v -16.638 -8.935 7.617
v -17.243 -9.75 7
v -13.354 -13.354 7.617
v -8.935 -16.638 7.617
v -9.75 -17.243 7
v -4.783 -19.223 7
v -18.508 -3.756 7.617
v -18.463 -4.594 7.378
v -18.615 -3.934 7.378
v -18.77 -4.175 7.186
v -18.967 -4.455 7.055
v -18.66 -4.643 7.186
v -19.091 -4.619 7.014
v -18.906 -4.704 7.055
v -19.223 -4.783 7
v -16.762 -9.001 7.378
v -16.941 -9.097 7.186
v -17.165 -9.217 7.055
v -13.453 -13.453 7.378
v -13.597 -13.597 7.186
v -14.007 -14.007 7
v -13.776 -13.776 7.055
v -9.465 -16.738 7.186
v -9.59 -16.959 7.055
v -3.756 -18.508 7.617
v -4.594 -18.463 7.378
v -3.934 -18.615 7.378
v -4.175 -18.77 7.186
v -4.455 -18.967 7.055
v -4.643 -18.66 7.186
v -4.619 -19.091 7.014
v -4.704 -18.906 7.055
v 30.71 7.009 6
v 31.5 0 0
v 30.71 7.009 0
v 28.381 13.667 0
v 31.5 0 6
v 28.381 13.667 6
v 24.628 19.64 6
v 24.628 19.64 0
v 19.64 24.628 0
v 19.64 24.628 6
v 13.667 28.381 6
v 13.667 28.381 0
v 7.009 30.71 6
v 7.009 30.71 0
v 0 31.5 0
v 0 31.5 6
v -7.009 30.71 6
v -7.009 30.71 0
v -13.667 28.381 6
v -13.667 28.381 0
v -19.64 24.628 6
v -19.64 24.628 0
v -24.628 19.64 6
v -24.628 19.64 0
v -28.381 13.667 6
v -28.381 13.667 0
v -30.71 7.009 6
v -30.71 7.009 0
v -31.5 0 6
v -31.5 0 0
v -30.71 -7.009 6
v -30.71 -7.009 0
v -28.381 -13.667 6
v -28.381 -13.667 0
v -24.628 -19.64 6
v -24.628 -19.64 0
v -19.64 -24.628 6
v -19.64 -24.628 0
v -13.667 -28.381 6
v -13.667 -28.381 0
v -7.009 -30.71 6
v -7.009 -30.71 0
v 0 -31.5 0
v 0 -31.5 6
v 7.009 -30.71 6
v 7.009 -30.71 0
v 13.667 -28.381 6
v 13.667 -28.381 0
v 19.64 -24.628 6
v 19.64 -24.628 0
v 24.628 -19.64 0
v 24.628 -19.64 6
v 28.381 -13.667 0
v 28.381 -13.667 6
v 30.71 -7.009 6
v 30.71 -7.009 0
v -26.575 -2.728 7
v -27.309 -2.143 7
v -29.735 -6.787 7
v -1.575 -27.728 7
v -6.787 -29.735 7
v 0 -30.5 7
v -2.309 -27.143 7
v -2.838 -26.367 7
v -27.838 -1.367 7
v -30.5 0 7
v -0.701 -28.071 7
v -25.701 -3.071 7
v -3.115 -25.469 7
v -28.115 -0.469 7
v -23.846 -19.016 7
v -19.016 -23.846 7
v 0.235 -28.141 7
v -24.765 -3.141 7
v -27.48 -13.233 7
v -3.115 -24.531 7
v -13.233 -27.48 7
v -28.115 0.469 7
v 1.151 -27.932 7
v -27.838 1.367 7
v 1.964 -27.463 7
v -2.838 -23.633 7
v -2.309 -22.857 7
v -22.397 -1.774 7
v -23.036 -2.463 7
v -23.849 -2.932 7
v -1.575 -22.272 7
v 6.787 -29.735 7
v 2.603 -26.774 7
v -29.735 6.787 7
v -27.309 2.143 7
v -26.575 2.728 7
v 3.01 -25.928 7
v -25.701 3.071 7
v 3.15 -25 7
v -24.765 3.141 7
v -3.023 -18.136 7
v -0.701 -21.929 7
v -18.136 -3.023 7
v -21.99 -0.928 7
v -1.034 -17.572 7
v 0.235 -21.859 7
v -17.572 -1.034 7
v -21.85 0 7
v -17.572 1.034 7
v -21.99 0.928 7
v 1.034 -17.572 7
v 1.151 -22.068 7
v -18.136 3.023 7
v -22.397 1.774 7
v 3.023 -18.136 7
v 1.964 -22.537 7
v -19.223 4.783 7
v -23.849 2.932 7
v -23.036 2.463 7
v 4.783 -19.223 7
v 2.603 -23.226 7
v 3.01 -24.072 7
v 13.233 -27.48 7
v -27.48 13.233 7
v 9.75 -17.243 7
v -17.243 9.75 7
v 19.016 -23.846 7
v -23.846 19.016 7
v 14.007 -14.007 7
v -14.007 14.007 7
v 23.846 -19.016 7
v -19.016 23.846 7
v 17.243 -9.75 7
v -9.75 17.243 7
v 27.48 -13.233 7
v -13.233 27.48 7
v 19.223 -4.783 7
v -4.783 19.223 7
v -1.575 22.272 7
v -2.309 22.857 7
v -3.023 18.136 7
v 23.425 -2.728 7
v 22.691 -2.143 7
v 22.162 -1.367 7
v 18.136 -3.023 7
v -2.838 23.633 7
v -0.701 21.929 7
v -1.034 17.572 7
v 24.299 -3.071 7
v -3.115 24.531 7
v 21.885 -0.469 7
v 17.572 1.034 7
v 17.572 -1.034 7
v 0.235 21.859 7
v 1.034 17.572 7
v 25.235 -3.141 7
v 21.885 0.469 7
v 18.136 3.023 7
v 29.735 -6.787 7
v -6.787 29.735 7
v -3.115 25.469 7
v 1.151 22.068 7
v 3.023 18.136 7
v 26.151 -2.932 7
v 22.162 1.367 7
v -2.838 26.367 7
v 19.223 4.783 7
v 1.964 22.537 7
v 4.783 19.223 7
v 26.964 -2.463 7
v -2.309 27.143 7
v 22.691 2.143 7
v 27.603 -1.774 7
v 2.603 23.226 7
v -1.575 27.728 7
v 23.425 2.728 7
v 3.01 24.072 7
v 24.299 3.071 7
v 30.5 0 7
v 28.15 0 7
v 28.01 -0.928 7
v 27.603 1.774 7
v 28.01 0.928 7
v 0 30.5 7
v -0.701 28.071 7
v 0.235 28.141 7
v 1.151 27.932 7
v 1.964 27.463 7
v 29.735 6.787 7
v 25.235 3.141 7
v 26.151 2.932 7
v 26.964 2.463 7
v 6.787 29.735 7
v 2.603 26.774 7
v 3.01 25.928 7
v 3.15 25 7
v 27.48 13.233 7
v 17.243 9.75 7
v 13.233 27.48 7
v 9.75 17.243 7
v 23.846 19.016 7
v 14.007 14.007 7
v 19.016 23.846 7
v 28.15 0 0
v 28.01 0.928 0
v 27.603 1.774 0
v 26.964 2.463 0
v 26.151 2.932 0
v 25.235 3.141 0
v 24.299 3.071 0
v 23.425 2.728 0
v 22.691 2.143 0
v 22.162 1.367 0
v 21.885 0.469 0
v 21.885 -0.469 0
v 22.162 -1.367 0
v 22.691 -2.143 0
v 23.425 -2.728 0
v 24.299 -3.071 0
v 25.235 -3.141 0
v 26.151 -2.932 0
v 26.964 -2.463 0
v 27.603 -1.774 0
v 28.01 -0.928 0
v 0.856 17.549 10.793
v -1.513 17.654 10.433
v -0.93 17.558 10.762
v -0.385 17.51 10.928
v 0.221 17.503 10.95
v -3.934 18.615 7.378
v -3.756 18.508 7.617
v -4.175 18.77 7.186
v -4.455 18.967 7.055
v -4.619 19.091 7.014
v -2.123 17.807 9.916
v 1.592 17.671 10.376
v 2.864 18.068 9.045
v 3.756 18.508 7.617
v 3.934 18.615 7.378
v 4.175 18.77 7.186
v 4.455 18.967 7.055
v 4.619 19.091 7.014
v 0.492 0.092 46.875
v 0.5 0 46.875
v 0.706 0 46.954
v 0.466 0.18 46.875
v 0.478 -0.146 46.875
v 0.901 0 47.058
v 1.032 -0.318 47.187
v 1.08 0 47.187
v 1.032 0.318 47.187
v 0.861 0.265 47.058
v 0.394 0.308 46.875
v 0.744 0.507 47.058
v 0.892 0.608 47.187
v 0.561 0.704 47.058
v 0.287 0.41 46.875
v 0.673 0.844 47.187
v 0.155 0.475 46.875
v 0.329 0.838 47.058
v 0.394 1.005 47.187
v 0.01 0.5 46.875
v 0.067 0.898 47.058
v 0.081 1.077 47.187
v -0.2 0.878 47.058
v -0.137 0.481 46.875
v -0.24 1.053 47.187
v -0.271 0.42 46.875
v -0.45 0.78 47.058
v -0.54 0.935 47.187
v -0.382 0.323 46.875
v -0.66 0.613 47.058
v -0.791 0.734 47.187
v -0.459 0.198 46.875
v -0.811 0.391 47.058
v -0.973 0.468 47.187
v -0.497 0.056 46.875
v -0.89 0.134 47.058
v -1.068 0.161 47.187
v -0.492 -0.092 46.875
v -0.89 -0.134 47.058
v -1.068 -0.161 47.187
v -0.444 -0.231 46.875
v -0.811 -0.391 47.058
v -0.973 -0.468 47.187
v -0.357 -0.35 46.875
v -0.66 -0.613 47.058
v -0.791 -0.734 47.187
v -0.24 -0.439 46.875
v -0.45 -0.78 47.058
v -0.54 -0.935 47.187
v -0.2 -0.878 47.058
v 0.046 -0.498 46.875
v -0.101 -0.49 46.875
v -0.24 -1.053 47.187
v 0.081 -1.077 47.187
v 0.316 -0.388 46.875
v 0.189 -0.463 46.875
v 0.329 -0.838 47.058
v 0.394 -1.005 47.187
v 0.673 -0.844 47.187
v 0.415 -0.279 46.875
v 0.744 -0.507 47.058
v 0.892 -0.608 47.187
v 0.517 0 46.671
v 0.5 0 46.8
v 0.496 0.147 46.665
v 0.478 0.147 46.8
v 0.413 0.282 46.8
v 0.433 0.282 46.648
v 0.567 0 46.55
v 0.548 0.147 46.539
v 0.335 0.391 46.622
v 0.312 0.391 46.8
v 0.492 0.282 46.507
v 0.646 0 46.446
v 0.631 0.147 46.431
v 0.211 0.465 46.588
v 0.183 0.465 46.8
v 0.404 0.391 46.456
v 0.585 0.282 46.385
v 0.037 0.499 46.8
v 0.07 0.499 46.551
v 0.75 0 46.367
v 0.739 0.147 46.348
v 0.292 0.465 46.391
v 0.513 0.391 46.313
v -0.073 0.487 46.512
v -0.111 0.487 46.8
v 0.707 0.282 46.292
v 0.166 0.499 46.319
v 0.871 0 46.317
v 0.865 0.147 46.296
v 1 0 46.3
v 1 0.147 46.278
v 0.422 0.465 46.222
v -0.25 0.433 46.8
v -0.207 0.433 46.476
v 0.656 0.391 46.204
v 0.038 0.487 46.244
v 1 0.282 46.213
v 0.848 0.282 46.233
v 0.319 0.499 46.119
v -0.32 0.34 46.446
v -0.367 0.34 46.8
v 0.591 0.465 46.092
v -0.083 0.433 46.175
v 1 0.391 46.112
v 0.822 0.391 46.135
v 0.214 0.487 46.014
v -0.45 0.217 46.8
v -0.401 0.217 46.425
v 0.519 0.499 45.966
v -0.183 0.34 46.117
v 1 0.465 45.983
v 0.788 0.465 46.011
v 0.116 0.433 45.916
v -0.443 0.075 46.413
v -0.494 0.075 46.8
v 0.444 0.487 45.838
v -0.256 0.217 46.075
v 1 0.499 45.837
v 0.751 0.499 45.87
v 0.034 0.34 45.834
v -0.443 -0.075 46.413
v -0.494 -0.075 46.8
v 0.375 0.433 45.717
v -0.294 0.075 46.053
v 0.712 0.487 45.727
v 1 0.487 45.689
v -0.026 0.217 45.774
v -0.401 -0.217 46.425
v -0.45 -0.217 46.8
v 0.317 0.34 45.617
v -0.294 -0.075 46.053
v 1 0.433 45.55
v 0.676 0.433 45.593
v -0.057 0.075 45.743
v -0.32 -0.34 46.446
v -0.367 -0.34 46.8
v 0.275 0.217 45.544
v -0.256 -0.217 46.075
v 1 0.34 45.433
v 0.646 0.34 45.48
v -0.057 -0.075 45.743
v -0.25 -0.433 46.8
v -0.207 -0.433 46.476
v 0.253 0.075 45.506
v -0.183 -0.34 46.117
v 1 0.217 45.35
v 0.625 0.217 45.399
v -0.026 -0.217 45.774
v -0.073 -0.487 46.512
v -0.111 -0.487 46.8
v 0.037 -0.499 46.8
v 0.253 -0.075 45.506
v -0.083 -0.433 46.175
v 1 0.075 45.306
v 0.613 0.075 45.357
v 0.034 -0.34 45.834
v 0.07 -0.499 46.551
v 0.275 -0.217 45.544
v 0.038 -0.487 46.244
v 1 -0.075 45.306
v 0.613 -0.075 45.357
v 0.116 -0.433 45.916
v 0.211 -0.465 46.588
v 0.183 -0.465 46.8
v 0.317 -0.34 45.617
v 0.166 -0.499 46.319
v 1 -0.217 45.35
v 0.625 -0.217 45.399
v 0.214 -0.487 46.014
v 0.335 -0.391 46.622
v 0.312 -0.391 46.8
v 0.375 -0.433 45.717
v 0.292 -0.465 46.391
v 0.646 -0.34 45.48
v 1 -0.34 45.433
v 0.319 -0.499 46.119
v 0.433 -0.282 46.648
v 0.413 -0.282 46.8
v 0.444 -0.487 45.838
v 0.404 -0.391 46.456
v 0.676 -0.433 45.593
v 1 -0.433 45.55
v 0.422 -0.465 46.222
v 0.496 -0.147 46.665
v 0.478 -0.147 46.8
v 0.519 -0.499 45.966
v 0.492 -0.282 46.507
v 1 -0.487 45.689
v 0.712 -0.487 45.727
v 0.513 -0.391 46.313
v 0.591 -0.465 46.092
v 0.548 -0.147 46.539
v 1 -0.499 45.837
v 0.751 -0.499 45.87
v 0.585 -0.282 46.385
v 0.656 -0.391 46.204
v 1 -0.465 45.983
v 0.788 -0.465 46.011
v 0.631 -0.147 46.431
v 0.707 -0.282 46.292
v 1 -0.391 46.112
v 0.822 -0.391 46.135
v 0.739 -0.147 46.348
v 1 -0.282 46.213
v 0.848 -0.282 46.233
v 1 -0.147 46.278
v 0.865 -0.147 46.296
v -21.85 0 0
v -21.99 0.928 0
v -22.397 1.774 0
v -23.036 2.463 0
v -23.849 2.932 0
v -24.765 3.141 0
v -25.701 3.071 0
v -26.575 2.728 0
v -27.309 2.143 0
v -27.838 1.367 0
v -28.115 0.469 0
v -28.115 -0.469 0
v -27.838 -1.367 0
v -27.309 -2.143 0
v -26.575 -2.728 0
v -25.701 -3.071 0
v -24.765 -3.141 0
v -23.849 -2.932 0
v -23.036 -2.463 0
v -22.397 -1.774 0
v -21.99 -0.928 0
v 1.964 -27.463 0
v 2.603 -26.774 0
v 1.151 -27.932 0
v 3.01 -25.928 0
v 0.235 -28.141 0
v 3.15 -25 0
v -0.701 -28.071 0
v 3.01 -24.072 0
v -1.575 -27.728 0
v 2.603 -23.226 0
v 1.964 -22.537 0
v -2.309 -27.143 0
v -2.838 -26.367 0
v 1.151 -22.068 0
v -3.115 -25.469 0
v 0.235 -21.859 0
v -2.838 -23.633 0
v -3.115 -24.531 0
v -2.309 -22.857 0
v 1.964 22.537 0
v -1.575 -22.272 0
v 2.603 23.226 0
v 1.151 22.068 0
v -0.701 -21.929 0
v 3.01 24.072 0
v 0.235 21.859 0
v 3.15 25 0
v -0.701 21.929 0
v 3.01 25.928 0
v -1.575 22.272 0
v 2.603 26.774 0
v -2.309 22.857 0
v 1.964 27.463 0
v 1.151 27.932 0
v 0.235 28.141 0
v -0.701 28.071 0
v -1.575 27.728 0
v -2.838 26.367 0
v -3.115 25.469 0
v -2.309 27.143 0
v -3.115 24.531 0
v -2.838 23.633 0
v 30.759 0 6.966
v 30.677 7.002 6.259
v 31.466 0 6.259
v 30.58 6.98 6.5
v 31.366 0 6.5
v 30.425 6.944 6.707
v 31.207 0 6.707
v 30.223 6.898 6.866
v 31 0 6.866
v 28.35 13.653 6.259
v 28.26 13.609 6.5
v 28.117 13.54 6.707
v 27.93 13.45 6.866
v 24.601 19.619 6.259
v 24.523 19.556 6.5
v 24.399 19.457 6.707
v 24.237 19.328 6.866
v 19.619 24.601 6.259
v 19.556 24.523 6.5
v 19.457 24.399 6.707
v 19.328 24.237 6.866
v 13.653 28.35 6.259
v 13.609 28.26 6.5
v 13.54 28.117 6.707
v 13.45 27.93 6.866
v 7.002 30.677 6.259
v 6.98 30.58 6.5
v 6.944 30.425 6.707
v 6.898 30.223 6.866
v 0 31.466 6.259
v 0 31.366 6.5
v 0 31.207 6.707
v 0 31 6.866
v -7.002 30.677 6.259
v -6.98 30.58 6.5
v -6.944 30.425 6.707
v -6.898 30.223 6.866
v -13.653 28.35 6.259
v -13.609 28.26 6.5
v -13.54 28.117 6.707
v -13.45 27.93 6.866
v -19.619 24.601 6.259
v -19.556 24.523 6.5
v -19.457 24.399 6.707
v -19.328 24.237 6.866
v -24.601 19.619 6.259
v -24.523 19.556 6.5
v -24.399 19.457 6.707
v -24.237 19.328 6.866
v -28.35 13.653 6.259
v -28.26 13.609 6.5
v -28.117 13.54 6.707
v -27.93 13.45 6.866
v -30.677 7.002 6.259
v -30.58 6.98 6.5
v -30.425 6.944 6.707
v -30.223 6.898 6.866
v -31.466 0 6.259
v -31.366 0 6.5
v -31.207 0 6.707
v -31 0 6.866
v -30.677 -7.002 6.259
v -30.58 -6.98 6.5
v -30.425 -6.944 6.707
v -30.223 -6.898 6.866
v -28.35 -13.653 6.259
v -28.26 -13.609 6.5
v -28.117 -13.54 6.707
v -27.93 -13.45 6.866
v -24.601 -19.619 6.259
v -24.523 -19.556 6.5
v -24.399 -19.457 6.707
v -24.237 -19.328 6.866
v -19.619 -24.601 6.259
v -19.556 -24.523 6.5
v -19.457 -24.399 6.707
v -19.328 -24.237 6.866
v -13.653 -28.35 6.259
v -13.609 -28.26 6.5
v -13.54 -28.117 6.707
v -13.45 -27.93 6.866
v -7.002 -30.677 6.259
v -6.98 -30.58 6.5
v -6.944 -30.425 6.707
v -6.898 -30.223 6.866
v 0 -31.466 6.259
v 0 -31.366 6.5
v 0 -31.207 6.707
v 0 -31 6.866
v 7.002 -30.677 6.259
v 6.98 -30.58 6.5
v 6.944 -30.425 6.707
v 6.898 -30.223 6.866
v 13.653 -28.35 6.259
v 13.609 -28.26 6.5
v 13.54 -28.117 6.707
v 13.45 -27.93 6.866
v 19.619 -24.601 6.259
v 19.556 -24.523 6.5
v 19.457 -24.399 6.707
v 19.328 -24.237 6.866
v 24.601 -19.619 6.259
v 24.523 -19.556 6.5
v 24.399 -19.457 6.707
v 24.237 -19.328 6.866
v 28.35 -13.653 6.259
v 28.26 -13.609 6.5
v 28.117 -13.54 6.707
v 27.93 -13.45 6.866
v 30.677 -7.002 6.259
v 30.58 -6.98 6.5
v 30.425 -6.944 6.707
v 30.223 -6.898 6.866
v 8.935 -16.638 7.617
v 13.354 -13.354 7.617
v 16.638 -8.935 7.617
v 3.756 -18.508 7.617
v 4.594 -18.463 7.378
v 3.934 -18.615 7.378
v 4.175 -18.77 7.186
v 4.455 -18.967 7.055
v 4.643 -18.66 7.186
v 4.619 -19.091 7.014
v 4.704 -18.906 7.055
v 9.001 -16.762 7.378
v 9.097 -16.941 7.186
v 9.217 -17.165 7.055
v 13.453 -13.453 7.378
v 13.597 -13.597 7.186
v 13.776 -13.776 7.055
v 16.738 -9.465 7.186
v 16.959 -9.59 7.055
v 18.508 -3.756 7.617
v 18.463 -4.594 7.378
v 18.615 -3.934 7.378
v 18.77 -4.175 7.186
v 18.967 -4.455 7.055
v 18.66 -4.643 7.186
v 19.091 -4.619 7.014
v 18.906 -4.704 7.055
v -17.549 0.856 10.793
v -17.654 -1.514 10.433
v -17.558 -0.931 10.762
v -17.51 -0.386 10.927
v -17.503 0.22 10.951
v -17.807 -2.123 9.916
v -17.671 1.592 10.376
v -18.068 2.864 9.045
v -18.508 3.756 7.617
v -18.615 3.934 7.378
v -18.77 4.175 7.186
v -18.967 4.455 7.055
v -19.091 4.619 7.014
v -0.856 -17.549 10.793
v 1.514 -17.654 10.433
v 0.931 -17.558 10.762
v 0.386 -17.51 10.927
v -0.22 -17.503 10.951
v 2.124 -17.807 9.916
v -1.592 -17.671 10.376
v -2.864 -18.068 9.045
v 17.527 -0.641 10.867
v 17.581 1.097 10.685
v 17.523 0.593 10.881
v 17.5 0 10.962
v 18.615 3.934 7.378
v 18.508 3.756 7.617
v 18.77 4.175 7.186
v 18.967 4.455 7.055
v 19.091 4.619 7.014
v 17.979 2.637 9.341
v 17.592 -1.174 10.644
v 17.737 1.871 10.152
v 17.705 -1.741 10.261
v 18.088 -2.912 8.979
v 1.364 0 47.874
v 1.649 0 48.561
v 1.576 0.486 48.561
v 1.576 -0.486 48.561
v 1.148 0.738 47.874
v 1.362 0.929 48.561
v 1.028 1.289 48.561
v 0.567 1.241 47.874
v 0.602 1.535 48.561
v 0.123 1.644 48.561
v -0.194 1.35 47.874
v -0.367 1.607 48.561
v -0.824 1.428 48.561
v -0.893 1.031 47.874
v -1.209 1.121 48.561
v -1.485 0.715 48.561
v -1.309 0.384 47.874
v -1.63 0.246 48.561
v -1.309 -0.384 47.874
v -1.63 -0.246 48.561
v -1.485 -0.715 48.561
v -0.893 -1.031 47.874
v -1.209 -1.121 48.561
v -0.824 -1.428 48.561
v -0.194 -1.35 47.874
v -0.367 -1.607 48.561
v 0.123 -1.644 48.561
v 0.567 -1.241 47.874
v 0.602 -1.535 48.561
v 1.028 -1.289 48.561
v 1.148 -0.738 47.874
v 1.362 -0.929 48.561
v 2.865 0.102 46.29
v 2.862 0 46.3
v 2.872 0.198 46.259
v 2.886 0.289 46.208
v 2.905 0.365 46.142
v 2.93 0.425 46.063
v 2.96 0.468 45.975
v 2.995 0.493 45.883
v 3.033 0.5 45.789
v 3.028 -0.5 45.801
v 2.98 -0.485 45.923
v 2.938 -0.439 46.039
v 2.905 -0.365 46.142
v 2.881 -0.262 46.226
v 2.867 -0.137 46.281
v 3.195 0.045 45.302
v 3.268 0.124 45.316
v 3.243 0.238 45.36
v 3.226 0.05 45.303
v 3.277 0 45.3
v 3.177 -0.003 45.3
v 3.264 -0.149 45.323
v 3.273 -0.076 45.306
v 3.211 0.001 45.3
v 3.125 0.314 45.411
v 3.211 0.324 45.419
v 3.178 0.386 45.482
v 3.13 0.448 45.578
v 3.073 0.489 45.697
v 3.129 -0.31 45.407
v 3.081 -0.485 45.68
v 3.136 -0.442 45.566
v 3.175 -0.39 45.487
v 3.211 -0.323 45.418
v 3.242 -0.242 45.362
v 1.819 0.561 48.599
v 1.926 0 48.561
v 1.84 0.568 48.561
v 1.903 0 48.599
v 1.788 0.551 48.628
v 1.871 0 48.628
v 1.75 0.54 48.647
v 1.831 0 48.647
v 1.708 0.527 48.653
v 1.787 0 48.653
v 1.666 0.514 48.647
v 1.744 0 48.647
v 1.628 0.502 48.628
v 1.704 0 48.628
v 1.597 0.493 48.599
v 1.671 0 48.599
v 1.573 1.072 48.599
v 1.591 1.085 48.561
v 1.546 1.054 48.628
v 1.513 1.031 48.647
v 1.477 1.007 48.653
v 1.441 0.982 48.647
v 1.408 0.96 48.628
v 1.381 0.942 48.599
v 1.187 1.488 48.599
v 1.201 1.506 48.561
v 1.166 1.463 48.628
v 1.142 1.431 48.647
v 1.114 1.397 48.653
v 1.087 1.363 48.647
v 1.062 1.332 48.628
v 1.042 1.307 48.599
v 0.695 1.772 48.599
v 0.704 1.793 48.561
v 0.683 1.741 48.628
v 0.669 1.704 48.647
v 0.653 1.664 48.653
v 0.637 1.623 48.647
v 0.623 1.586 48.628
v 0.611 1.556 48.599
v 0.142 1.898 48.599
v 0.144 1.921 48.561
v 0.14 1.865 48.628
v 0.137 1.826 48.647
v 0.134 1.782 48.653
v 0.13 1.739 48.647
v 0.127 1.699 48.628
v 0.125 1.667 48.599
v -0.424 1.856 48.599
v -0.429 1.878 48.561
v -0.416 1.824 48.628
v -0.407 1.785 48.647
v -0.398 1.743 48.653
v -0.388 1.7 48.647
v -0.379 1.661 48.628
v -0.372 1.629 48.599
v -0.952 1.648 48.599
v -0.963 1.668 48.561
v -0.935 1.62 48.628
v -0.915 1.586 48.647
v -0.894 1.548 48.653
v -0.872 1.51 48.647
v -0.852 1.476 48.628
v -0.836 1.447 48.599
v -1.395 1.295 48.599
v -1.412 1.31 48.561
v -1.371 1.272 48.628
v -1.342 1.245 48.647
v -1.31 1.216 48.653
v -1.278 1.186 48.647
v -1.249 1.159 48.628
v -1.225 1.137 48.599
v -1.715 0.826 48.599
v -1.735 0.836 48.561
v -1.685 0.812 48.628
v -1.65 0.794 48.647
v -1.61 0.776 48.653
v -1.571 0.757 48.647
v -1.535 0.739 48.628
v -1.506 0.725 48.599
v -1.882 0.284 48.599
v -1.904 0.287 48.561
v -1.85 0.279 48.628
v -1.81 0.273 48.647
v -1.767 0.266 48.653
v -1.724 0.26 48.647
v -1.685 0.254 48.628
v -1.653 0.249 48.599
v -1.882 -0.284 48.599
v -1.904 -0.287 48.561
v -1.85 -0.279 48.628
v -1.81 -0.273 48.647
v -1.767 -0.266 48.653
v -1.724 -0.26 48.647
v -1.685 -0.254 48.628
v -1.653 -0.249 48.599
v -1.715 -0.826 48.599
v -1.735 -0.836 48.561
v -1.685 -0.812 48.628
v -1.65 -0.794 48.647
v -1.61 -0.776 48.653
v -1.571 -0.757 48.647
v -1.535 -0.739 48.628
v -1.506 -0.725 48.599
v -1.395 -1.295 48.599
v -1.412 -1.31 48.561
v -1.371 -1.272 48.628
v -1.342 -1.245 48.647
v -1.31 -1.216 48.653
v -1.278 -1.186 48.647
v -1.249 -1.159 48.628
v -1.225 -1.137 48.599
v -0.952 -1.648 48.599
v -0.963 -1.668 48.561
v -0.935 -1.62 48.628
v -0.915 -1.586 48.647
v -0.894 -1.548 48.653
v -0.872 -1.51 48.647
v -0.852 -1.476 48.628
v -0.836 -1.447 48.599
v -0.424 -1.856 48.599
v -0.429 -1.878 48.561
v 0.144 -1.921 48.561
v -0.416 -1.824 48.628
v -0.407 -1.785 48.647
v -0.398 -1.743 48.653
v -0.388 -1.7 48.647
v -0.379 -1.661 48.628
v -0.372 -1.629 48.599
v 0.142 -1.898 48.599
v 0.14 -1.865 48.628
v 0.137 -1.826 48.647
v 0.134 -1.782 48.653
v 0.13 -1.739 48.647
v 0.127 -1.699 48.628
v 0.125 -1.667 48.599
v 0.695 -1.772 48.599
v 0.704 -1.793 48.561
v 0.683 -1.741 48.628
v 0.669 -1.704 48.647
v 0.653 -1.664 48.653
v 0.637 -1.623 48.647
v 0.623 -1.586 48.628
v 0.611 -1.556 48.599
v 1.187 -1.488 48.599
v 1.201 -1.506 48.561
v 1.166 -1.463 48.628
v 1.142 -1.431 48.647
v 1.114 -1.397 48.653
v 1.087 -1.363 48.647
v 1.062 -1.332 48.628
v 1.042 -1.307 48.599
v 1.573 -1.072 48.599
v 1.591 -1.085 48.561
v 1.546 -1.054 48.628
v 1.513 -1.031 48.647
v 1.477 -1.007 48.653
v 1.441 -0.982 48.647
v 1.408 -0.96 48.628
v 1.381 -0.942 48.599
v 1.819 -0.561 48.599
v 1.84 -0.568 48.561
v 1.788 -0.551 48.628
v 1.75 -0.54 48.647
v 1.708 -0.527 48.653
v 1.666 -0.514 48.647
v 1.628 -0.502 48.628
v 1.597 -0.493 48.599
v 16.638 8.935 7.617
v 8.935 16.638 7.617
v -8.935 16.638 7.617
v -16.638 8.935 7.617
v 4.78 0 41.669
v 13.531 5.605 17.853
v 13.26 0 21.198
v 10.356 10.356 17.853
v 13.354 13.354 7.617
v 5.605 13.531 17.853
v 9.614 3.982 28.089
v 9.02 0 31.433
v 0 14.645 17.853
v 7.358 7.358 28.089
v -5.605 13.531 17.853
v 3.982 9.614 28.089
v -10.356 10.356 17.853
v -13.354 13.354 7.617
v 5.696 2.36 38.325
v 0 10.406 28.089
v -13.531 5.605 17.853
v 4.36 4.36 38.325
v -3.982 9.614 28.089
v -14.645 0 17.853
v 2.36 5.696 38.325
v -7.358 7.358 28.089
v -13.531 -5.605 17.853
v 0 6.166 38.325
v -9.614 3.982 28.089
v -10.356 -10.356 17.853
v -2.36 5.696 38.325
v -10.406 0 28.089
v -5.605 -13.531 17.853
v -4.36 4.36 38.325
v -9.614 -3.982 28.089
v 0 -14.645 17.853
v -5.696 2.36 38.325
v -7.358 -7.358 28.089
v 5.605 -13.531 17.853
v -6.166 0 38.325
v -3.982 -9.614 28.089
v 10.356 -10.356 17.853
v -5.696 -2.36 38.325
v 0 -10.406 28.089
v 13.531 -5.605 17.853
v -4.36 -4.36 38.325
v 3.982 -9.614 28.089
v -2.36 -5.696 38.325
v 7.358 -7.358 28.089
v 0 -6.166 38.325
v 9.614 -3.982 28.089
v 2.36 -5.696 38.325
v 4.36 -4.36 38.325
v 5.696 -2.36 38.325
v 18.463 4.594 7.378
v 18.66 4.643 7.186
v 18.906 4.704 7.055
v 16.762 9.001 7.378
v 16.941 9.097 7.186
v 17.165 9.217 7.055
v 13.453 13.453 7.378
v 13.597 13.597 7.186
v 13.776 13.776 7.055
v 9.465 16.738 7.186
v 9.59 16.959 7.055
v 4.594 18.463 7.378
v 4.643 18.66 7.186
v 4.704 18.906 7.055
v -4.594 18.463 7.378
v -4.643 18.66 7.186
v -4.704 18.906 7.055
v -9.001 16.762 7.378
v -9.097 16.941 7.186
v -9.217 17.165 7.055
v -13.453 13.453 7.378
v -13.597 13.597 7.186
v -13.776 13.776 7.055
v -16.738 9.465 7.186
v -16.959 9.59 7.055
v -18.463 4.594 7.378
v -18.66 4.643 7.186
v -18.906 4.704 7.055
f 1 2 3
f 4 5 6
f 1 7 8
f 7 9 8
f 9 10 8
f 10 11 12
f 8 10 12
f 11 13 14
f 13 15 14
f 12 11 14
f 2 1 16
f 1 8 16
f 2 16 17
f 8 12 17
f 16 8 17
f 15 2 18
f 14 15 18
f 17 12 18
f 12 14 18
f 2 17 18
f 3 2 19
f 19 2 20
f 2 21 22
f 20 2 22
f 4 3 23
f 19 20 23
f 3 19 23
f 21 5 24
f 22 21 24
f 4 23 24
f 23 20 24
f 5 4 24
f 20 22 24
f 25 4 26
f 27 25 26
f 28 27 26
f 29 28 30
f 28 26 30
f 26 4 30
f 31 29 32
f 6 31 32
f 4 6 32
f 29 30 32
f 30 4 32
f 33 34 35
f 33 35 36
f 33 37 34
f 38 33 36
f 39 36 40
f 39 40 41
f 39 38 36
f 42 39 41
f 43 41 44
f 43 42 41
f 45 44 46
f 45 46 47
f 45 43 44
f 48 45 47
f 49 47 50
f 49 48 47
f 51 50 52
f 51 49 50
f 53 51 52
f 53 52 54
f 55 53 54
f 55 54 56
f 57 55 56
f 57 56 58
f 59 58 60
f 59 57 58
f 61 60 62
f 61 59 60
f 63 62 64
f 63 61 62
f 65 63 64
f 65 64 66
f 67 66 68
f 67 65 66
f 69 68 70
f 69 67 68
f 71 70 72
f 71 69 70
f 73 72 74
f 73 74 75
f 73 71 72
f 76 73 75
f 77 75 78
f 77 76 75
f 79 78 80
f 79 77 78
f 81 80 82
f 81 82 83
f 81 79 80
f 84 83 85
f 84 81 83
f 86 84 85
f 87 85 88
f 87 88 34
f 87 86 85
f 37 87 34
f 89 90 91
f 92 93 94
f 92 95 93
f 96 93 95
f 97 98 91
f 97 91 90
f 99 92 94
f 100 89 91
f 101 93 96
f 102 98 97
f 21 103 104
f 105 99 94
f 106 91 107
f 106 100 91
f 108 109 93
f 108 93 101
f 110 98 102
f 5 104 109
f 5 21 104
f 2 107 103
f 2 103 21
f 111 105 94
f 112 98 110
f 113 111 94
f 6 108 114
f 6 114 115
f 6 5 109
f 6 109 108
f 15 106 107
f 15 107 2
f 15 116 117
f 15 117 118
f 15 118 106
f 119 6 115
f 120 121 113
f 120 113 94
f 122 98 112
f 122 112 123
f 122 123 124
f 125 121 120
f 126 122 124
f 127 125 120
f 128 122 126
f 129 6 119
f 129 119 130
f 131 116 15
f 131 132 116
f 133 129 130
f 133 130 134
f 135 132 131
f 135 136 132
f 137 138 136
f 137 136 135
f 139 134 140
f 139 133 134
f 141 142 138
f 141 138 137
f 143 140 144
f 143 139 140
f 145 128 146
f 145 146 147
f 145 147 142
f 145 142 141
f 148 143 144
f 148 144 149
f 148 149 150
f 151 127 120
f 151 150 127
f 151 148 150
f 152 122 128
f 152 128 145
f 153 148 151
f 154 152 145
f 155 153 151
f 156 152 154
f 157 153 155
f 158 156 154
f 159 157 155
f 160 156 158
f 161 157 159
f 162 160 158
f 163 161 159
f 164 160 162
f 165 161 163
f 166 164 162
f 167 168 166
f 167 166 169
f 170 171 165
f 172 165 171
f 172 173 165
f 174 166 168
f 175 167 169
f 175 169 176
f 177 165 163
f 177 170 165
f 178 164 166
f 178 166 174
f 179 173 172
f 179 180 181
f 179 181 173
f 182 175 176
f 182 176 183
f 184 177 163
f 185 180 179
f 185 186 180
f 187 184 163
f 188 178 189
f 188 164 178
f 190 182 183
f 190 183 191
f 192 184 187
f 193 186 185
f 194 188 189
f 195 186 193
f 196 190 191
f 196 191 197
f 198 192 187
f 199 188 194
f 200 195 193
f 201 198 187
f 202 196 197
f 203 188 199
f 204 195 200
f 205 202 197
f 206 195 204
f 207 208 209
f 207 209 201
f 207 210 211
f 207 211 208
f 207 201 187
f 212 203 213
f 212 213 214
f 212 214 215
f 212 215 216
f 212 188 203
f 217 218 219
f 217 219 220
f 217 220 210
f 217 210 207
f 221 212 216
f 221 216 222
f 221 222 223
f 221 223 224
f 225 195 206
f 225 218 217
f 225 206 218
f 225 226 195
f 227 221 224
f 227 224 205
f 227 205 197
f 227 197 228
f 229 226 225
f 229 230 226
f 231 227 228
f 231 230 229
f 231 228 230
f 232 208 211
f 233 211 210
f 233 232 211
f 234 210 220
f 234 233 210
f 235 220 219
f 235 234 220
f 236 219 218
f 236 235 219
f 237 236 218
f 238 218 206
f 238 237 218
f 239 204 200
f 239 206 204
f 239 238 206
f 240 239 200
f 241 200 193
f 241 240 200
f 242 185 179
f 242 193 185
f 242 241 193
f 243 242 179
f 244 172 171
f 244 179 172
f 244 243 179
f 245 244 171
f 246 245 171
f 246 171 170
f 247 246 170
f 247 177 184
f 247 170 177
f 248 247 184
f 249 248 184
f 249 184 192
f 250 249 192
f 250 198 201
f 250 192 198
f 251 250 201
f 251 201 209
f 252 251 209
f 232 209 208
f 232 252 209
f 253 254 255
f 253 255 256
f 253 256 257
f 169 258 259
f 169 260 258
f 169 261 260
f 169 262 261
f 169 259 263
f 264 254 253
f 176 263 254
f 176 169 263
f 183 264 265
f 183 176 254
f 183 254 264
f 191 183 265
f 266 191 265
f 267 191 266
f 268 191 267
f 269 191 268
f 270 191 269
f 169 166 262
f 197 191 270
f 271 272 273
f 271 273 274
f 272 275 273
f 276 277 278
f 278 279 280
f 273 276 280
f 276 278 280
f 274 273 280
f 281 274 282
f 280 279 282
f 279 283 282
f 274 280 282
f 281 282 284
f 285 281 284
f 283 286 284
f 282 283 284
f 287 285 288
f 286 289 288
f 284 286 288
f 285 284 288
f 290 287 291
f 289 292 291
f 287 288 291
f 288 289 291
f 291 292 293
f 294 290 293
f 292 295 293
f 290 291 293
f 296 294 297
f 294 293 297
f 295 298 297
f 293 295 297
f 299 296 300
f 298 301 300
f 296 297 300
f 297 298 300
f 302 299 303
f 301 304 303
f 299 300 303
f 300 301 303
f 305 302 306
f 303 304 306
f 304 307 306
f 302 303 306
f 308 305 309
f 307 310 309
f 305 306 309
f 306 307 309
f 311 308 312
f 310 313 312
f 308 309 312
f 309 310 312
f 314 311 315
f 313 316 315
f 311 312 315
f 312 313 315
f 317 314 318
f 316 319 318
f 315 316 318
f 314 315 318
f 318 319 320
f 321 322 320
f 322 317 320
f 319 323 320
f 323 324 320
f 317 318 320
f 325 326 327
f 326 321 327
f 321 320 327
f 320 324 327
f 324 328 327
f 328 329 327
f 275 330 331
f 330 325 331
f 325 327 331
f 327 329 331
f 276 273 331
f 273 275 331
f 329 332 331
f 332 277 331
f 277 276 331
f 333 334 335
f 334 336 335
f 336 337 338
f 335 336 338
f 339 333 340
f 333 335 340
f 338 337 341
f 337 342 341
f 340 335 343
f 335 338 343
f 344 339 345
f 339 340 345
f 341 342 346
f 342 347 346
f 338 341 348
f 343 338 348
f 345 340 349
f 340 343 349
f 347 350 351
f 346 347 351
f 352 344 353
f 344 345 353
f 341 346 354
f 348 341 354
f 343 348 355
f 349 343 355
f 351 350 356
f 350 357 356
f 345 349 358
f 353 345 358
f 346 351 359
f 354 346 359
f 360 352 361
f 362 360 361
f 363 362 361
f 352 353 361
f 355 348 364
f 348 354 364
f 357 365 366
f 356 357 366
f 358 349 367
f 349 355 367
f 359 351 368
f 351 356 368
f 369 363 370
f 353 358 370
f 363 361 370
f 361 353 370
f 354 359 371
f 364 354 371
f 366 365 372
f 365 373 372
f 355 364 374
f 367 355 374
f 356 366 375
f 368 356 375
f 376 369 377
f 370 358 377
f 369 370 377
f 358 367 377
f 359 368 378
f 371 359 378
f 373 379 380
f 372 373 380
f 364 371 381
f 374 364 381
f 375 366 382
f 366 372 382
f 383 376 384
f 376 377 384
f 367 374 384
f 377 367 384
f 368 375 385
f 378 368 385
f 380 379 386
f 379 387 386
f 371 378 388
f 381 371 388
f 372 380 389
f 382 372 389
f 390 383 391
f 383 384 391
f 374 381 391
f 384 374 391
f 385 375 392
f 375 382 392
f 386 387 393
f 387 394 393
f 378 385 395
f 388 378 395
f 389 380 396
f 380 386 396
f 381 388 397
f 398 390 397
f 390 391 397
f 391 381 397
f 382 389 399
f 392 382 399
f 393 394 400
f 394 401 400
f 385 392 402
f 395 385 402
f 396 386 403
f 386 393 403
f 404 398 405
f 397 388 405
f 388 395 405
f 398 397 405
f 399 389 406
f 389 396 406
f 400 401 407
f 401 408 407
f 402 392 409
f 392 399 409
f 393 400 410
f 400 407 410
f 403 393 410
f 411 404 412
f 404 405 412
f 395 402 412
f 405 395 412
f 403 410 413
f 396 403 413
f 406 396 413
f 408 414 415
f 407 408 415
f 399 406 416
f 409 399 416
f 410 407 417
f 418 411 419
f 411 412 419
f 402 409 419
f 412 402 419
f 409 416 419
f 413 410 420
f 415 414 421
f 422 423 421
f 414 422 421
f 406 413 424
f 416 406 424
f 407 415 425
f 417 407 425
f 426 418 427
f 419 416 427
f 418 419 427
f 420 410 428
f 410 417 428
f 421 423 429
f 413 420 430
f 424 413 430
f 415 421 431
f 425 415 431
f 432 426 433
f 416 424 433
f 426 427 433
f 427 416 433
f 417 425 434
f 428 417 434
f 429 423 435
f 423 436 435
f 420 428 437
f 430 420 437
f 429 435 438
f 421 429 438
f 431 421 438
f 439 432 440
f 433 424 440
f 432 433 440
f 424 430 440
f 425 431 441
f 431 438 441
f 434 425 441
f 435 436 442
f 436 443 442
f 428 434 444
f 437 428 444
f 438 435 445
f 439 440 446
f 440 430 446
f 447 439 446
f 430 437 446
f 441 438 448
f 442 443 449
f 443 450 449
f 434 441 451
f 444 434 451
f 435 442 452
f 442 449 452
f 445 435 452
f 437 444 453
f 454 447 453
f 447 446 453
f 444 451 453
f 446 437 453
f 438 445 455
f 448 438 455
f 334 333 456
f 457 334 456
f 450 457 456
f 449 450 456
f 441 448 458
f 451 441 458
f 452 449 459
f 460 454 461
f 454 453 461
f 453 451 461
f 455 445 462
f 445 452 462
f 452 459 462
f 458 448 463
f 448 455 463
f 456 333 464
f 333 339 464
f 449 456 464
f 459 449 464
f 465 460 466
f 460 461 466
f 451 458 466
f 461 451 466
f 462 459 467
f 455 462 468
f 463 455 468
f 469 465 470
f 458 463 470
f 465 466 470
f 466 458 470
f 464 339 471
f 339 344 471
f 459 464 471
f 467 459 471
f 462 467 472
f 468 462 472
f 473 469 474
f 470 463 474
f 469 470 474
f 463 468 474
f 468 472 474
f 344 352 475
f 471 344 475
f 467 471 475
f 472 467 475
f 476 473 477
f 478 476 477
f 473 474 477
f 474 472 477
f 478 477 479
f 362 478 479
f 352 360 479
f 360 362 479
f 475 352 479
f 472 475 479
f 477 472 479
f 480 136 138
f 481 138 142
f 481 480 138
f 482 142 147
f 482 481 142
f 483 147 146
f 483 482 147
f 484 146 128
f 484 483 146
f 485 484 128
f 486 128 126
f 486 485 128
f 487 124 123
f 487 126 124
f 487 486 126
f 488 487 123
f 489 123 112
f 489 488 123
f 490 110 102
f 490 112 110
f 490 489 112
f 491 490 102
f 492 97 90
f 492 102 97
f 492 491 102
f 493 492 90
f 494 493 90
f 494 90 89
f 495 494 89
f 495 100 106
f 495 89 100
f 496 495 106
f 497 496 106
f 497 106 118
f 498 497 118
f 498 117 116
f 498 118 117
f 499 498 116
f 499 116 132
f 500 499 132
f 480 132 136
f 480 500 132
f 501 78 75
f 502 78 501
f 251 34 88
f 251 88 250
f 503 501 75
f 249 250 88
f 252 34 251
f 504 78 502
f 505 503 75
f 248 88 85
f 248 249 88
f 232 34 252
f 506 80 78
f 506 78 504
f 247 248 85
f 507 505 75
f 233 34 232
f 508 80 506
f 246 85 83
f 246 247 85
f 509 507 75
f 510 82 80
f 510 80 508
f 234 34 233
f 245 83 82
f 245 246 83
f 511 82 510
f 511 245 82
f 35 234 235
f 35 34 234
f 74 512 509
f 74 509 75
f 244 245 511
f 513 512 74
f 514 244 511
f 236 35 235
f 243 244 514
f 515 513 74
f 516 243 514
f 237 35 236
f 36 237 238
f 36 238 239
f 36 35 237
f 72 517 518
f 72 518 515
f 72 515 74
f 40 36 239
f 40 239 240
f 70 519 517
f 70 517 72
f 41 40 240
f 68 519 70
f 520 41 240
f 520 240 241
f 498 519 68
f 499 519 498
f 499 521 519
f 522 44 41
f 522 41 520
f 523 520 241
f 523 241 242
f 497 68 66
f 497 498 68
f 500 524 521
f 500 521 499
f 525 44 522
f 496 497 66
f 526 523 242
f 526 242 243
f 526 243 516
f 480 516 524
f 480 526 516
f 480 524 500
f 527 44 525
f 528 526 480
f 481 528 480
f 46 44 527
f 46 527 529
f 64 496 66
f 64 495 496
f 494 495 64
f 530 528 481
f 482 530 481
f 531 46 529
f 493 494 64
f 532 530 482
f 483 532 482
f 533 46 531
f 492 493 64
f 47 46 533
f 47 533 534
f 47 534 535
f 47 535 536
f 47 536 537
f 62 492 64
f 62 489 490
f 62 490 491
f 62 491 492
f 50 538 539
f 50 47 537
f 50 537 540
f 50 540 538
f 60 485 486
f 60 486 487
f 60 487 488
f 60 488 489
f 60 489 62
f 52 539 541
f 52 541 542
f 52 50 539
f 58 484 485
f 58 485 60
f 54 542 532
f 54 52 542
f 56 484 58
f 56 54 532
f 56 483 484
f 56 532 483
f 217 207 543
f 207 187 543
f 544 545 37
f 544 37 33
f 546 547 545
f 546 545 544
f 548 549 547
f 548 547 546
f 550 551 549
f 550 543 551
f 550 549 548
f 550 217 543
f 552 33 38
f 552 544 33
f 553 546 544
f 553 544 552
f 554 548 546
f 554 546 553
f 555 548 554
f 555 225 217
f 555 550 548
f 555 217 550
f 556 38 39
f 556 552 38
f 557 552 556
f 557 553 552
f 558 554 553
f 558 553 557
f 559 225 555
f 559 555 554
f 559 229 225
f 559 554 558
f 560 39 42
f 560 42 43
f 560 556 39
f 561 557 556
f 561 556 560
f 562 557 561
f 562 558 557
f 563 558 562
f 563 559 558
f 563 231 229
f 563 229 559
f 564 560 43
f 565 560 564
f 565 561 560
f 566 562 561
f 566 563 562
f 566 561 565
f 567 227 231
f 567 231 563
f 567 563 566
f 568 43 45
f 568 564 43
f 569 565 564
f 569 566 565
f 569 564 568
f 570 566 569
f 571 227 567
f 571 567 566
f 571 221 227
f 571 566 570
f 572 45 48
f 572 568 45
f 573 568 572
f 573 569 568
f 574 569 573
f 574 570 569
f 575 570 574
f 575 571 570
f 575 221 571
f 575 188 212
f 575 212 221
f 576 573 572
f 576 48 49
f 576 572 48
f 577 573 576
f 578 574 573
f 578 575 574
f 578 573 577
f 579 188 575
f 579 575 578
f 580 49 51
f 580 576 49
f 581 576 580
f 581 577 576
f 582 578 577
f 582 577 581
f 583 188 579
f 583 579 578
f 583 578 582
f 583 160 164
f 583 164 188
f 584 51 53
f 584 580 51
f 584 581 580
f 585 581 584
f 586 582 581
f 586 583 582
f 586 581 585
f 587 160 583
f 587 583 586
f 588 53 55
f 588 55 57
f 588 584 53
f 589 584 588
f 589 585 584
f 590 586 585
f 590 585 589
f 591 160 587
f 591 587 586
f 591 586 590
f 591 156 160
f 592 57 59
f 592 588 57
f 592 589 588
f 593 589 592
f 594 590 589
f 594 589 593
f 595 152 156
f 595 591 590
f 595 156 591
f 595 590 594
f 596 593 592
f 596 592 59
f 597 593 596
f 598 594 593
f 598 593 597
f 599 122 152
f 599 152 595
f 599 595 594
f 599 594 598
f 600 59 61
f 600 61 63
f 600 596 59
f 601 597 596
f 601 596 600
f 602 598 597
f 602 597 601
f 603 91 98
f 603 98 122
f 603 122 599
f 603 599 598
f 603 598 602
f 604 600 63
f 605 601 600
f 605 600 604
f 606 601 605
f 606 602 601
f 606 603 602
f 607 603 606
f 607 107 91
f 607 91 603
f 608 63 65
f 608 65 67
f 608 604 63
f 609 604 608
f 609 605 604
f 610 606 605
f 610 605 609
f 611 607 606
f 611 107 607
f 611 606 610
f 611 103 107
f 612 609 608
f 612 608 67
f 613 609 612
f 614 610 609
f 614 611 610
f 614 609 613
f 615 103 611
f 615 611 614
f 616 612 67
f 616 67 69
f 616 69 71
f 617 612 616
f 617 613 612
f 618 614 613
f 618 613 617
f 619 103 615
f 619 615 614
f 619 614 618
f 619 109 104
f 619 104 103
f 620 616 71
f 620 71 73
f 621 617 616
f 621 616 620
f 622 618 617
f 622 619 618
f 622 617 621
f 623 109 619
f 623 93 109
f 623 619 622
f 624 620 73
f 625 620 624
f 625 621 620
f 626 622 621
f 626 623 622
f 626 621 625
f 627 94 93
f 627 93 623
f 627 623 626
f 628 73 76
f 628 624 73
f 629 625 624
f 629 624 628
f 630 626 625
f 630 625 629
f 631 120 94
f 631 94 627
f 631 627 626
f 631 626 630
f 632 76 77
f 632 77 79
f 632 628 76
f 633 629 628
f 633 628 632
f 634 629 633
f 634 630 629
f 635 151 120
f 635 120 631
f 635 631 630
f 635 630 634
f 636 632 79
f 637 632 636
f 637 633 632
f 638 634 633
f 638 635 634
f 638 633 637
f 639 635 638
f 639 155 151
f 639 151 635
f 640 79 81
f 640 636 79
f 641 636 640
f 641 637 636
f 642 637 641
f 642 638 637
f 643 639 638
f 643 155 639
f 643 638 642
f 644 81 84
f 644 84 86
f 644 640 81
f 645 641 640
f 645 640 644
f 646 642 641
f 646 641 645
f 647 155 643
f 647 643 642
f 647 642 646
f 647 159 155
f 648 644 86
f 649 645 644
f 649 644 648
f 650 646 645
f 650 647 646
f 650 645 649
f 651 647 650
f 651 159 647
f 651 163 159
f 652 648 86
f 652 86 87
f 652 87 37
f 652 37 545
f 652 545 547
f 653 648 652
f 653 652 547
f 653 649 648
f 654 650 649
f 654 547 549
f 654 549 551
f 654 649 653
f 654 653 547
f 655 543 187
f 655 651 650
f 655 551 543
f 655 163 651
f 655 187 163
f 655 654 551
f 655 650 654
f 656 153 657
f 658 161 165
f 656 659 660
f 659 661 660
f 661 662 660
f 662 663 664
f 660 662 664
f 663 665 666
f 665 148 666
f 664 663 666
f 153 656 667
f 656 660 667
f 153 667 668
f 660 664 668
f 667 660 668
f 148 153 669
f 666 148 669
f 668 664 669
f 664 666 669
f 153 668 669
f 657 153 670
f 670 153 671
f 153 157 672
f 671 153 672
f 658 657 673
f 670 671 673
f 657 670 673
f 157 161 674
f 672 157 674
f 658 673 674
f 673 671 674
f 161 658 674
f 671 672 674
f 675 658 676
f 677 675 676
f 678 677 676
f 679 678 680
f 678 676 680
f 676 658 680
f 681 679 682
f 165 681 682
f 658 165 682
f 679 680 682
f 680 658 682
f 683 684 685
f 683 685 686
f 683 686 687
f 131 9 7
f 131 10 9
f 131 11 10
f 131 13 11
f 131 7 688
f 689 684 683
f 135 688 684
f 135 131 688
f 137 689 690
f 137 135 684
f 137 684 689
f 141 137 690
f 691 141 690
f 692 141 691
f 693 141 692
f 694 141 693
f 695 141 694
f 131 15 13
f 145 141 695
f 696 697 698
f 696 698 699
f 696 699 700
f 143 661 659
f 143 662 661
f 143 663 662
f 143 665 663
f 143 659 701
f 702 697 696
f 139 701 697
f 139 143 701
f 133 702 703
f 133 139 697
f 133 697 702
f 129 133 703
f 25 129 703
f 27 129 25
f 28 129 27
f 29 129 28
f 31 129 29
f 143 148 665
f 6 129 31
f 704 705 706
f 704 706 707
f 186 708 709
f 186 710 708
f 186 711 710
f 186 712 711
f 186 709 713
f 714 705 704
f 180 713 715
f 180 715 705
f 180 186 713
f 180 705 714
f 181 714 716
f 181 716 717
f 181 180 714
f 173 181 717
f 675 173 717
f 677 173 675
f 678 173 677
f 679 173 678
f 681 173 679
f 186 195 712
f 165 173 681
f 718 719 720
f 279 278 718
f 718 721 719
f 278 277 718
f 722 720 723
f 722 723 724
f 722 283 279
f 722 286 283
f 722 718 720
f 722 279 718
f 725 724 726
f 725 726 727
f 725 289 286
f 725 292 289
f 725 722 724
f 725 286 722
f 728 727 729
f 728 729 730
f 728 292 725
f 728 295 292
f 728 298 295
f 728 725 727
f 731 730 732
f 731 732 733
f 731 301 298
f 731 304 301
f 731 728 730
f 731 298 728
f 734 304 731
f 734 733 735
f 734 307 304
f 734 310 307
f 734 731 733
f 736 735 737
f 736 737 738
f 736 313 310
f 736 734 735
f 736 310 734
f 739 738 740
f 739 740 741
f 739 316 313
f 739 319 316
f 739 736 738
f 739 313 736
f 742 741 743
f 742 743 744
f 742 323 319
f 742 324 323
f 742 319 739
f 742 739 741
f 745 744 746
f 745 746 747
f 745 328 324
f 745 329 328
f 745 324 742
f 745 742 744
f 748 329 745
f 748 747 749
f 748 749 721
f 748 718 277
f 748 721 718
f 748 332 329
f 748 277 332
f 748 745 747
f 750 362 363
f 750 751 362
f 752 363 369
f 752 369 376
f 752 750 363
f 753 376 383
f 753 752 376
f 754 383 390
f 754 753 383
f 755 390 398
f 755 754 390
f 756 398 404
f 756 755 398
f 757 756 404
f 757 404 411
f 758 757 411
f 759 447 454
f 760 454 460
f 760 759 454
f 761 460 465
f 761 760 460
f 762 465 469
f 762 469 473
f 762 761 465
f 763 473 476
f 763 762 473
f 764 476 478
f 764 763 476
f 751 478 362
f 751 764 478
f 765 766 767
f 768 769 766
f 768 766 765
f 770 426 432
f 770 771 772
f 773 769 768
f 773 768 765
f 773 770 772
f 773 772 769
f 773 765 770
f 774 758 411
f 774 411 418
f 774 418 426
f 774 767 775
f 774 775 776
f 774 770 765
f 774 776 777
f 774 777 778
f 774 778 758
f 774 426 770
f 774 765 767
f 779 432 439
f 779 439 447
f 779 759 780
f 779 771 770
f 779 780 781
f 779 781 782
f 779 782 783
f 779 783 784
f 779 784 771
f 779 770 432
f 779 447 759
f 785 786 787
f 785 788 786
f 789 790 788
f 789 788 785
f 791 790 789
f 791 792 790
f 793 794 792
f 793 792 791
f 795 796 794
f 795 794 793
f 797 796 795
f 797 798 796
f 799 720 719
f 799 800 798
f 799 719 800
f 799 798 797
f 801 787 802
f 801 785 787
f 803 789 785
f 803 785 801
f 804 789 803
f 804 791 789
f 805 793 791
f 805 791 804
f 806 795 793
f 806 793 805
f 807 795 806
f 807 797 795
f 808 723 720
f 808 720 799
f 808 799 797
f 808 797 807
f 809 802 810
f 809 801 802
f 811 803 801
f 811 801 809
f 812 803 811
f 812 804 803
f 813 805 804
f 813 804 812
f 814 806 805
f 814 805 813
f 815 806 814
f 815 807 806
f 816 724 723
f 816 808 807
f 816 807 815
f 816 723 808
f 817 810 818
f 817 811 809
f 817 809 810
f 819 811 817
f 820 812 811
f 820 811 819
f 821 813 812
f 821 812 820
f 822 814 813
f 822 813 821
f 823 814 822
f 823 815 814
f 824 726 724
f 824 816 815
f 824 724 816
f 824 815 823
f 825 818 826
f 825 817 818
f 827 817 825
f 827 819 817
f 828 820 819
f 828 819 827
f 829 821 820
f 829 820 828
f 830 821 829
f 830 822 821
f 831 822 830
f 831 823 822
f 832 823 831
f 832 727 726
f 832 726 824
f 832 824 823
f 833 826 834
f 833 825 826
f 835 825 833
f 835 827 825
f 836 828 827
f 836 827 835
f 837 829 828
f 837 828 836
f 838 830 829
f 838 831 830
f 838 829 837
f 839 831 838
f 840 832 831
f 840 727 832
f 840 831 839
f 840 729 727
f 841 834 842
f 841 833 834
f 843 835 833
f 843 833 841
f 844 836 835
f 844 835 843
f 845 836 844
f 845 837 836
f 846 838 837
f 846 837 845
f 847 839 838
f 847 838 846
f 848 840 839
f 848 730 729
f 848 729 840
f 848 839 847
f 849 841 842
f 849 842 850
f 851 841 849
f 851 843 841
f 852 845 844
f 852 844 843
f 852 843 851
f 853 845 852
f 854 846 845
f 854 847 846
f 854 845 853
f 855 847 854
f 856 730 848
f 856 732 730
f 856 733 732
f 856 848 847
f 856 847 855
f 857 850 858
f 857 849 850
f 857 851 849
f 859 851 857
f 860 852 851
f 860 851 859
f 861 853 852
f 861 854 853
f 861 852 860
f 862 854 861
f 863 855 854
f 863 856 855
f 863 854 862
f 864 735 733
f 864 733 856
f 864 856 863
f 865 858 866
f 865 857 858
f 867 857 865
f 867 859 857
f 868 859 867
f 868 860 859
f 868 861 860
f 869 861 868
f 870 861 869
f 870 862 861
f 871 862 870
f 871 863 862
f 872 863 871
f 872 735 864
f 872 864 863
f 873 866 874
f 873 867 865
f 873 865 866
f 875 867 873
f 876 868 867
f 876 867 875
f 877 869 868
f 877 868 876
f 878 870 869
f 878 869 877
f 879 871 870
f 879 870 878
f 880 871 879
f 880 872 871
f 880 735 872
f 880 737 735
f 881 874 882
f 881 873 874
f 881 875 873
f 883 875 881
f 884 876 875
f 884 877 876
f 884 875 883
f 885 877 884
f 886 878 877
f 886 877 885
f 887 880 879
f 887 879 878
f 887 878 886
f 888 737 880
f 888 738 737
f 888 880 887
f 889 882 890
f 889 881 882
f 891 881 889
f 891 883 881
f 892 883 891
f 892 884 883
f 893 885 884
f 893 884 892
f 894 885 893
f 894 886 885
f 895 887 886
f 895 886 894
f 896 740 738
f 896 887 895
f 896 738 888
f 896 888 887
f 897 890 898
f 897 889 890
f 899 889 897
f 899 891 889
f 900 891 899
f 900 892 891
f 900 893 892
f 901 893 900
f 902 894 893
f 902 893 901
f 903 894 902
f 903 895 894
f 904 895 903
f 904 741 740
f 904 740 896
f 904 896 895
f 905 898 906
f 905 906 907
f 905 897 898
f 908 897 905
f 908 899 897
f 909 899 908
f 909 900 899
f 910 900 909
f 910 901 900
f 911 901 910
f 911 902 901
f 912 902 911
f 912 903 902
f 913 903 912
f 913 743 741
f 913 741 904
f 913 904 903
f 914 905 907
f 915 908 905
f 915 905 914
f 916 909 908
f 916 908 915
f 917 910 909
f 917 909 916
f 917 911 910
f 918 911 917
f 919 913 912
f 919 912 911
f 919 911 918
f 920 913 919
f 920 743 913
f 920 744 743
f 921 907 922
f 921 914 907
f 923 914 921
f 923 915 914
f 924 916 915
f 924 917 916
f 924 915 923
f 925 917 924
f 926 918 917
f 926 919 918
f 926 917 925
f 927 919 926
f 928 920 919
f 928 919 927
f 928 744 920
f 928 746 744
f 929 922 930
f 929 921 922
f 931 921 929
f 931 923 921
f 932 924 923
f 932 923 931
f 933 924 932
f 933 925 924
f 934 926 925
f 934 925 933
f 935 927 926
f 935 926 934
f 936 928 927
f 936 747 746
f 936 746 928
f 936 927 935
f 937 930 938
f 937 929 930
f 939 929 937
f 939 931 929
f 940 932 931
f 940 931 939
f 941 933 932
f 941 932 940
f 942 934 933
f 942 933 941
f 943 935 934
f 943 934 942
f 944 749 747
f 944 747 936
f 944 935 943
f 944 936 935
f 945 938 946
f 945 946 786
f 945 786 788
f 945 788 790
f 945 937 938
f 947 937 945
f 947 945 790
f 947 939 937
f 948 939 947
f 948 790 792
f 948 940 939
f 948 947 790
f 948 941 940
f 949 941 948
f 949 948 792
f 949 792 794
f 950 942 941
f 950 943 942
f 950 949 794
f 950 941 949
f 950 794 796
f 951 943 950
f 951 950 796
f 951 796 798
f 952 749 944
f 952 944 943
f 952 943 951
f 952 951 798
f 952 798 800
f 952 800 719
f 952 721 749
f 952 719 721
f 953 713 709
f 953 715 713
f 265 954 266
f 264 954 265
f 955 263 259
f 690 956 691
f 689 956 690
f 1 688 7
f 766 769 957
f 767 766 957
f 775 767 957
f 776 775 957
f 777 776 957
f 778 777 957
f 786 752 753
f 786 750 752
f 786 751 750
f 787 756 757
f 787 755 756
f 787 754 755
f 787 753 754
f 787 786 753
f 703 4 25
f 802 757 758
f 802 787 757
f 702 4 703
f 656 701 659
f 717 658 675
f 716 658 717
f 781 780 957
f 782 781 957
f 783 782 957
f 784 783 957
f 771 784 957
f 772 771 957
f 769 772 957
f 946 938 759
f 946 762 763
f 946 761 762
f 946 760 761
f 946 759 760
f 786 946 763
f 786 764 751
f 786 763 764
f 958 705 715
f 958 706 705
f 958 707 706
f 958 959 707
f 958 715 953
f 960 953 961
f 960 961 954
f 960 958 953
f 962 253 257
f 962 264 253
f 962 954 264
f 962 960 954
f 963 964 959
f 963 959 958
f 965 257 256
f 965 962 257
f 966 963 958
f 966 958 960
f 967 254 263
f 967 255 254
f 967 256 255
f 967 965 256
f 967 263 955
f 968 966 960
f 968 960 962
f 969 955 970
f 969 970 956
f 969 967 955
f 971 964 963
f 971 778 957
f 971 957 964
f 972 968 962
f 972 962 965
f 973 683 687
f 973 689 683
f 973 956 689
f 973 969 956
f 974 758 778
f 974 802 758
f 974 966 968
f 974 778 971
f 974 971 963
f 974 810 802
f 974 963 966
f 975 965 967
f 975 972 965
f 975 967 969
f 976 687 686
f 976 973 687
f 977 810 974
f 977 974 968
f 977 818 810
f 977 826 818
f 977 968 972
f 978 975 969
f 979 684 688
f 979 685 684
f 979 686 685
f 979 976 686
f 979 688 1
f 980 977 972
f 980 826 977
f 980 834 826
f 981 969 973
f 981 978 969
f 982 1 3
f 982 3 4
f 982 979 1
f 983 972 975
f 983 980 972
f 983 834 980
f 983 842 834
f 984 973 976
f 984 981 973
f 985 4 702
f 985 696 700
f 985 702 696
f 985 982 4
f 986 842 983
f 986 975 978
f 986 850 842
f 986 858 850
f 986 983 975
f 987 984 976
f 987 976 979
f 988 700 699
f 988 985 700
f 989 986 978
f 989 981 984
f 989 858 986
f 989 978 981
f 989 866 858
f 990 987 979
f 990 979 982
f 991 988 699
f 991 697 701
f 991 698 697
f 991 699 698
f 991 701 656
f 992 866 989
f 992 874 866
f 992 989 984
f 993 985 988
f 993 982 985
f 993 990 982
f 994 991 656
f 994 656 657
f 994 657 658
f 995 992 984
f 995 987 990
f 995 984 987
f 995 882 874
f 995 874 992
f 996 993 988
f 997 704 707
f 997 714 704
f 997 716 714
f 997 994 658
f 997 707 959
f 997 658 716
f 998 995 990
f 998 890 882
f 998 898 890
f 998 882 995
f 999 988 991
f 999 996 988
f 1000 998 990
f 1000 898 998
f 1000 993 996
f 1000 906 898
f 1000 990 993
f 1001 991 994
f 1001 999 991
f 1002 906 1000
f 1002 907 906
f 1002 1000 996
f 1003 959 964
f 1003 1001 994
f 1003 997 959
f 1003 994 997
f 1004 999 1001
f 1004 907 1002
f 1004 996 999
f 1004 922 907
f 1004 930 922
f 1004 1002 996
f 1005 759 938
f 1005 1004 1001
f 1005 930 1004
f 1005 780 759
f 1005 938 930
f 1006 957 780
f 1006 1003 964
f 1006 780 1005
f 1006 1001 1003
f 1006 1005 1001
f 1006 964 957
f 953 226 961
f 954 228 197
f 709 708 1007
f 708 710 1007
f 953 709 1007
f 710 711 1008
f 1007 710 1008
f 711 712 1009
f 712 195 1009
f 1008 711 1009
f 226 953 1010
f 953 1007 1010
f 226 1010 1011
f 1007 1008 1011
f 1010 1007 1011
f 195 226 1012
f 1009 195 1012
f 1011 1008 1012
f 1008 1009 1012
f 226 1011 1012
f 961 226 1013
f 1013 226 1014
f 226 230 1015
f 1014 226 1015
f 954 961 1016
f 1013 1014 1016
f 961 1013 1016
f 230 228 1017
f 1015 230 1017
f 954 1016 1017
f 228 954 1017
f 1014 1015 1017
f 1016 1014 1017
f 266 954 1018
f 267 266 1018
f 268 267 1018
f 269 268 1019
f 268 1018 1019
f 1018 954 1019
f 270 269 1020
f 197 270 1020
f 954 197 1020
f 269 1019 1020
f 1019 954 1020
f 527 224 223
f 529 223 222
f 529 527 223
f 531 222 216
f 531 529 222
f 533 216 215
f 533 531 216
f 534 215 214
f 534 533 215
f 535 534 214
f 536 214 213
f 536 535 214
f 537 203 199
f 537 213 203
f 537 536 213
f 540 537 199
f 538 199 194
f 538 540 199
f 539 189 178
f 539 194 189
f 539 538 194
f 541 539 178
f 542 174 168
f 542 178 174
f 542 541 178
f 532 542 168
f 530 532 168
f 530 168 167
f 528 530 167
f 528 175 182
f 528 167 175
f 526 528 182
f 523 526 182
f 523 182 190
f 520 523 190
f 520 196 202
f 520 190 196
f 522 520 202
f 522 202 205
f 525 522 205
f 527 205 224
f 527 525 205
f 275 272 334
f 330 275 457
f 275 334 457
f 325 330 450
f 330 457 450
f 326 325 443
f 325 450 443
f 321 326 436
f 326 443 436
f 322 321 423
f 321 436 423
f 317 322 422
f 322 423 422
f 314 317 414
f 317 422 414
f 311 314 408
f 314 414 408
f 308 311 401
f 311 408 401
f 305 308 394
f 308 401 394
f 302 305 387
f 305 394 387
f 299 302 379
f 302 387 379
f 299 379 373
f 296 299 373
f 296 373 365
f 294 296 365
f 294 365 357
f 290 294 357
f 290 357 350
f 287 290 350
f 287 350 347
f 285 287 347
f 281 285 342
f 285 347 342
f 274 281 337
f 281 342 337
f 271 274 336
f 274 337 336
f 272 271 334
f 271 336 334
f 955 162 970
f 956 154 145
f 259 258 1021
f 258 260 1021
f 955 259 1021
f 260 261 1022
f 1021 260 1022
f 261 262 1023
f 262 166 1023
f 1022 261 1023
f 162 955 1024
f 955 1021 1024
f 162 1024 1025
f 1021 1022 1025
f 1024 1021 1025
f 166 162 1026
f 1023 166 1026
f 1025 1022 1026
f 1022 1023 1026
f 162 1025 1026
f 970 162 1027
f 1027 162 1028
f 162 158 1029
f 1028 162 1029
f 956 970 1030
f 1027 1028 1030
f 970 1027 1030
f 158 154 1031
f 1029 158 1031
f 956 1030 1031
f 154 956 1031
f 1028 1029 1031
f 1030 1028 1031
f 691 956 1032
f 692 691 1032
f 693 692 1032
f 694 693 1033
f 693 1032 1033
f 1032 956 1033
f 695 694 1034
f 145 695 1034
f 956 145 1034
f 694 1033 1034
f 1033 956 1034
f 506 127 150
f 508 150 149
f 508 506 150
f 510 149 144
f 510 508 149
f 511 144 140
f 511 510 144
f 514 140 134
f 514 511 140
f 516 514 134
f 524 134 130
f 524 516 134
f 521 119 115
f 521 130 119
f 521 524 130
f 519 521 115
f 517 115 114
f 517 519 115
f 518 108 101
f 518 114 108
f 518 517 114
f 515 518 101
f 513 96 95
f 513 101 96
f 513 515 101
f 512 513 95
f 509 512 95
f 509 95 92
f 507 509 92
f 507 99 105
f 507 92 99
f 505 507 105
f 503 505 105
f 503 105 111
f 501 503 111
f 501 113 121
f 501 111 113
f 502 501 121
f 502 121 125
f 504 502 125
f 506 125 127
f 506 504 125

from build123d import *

# Parameters (mm, degrees)
SKETCH004_R     = 3.15
POCKET_DEPTH    = 48.654386
SKETCH005_R     = 7.5
POCKET001_DEPTH = 41.654386
SKETCH006_R     = 0.5


with BuildPart() as part:
    # Sketch003 → Revolution (revolve)
    with BuildSketch(Plane.XZ):
        with BuildLine():
            Line((0, 0), (31.5, 0))
            Line((31.5, 0), (31.5, 6))
            ThreePointArc((31.5, 6), (31.207107, 6.707107), (30.5, 7))
            Line((30.5, 7), (19.809153, 7))
            ThreePointArc((18.885273, 7.617317), (19.253582, 7.16853), (19.809153, 7))
            Line((18.885273, 7.617317), (1.925932, 48.560789))
            ThreePointArc((1.925932, 48.560789), (1.78735, 48.653386), (1.648768, 48.560789))
            Line((1.648768, 48.560789), (1.079673, 47.186871))
            ThreePointArc((0, 46.8), (0.573446, 46.899638), (1.079673, 47.186871))
            Line((0, 0), (0, 46.8))
        make_face()
    revolve(axis=Axis((0, 0, 0), (0, 0, 1)))

    # Sketch004 → Pocket (cut, through all)
    with BuildSketch(Plane.XY):
        with Locations((25, 0)):
            Circle(SKETCH004_R)
        with Locations((-25, 0)):
            Circle(SKETCH004_R)
        with Locations((0, 25)):
            Circle(SKETCH004_R)
        with Locations((0, -25)):
            Circle(SKETCH004_R)
    extrude(amount=POCKET_DEPTH, mode=Mode.SUBTRACT)

    # Sketch005 (on DatumPlane) → Pocket001 (cut, through all)
    with BuildSketch(Plane(origin=(0, 0, 7), x_dir=(-1, 0, 0), z_dir=(0, 0, 1))):
        with Locations((25, 0)):
            Circle(SKETCH005_R)
        with Locations((0, 25)):
            Circle(SKETCH005_R)
        with Locations((-25, 0)):
            Circle(SKETCH005_R)
        with Locations((0, -25)):
            Circle(SKETCH005_R)
    extrude(amount=POCKET001_DEPTH, mode=Mode.SUBTRACT)

    # SubtractivePipe: sweep along a path in Sketch
    with BuildLine(Plane.XZ) as subtractivepipe_path:
        Line((0, 47.186871), (0, 46.8))
        ThreePointArc((0, 46.8), (0.292893, 46.092893), (1, 45.8))
        Line((1, 45.8), (3.069488, 45.8))
        Line((3.069488, 45.8), (4.069488, 45.8))
    # Sketch006 (on DatumPlane) → SubtractivePipe (sweep, cut)
    with BuildSketch(Plane.XY.offset(47.186871)):
        Circle(SKETCH006_R)
    sweep(path=subtractivepipe_path.line, mode=Mode.SUBTRACT)


solid = part.part
